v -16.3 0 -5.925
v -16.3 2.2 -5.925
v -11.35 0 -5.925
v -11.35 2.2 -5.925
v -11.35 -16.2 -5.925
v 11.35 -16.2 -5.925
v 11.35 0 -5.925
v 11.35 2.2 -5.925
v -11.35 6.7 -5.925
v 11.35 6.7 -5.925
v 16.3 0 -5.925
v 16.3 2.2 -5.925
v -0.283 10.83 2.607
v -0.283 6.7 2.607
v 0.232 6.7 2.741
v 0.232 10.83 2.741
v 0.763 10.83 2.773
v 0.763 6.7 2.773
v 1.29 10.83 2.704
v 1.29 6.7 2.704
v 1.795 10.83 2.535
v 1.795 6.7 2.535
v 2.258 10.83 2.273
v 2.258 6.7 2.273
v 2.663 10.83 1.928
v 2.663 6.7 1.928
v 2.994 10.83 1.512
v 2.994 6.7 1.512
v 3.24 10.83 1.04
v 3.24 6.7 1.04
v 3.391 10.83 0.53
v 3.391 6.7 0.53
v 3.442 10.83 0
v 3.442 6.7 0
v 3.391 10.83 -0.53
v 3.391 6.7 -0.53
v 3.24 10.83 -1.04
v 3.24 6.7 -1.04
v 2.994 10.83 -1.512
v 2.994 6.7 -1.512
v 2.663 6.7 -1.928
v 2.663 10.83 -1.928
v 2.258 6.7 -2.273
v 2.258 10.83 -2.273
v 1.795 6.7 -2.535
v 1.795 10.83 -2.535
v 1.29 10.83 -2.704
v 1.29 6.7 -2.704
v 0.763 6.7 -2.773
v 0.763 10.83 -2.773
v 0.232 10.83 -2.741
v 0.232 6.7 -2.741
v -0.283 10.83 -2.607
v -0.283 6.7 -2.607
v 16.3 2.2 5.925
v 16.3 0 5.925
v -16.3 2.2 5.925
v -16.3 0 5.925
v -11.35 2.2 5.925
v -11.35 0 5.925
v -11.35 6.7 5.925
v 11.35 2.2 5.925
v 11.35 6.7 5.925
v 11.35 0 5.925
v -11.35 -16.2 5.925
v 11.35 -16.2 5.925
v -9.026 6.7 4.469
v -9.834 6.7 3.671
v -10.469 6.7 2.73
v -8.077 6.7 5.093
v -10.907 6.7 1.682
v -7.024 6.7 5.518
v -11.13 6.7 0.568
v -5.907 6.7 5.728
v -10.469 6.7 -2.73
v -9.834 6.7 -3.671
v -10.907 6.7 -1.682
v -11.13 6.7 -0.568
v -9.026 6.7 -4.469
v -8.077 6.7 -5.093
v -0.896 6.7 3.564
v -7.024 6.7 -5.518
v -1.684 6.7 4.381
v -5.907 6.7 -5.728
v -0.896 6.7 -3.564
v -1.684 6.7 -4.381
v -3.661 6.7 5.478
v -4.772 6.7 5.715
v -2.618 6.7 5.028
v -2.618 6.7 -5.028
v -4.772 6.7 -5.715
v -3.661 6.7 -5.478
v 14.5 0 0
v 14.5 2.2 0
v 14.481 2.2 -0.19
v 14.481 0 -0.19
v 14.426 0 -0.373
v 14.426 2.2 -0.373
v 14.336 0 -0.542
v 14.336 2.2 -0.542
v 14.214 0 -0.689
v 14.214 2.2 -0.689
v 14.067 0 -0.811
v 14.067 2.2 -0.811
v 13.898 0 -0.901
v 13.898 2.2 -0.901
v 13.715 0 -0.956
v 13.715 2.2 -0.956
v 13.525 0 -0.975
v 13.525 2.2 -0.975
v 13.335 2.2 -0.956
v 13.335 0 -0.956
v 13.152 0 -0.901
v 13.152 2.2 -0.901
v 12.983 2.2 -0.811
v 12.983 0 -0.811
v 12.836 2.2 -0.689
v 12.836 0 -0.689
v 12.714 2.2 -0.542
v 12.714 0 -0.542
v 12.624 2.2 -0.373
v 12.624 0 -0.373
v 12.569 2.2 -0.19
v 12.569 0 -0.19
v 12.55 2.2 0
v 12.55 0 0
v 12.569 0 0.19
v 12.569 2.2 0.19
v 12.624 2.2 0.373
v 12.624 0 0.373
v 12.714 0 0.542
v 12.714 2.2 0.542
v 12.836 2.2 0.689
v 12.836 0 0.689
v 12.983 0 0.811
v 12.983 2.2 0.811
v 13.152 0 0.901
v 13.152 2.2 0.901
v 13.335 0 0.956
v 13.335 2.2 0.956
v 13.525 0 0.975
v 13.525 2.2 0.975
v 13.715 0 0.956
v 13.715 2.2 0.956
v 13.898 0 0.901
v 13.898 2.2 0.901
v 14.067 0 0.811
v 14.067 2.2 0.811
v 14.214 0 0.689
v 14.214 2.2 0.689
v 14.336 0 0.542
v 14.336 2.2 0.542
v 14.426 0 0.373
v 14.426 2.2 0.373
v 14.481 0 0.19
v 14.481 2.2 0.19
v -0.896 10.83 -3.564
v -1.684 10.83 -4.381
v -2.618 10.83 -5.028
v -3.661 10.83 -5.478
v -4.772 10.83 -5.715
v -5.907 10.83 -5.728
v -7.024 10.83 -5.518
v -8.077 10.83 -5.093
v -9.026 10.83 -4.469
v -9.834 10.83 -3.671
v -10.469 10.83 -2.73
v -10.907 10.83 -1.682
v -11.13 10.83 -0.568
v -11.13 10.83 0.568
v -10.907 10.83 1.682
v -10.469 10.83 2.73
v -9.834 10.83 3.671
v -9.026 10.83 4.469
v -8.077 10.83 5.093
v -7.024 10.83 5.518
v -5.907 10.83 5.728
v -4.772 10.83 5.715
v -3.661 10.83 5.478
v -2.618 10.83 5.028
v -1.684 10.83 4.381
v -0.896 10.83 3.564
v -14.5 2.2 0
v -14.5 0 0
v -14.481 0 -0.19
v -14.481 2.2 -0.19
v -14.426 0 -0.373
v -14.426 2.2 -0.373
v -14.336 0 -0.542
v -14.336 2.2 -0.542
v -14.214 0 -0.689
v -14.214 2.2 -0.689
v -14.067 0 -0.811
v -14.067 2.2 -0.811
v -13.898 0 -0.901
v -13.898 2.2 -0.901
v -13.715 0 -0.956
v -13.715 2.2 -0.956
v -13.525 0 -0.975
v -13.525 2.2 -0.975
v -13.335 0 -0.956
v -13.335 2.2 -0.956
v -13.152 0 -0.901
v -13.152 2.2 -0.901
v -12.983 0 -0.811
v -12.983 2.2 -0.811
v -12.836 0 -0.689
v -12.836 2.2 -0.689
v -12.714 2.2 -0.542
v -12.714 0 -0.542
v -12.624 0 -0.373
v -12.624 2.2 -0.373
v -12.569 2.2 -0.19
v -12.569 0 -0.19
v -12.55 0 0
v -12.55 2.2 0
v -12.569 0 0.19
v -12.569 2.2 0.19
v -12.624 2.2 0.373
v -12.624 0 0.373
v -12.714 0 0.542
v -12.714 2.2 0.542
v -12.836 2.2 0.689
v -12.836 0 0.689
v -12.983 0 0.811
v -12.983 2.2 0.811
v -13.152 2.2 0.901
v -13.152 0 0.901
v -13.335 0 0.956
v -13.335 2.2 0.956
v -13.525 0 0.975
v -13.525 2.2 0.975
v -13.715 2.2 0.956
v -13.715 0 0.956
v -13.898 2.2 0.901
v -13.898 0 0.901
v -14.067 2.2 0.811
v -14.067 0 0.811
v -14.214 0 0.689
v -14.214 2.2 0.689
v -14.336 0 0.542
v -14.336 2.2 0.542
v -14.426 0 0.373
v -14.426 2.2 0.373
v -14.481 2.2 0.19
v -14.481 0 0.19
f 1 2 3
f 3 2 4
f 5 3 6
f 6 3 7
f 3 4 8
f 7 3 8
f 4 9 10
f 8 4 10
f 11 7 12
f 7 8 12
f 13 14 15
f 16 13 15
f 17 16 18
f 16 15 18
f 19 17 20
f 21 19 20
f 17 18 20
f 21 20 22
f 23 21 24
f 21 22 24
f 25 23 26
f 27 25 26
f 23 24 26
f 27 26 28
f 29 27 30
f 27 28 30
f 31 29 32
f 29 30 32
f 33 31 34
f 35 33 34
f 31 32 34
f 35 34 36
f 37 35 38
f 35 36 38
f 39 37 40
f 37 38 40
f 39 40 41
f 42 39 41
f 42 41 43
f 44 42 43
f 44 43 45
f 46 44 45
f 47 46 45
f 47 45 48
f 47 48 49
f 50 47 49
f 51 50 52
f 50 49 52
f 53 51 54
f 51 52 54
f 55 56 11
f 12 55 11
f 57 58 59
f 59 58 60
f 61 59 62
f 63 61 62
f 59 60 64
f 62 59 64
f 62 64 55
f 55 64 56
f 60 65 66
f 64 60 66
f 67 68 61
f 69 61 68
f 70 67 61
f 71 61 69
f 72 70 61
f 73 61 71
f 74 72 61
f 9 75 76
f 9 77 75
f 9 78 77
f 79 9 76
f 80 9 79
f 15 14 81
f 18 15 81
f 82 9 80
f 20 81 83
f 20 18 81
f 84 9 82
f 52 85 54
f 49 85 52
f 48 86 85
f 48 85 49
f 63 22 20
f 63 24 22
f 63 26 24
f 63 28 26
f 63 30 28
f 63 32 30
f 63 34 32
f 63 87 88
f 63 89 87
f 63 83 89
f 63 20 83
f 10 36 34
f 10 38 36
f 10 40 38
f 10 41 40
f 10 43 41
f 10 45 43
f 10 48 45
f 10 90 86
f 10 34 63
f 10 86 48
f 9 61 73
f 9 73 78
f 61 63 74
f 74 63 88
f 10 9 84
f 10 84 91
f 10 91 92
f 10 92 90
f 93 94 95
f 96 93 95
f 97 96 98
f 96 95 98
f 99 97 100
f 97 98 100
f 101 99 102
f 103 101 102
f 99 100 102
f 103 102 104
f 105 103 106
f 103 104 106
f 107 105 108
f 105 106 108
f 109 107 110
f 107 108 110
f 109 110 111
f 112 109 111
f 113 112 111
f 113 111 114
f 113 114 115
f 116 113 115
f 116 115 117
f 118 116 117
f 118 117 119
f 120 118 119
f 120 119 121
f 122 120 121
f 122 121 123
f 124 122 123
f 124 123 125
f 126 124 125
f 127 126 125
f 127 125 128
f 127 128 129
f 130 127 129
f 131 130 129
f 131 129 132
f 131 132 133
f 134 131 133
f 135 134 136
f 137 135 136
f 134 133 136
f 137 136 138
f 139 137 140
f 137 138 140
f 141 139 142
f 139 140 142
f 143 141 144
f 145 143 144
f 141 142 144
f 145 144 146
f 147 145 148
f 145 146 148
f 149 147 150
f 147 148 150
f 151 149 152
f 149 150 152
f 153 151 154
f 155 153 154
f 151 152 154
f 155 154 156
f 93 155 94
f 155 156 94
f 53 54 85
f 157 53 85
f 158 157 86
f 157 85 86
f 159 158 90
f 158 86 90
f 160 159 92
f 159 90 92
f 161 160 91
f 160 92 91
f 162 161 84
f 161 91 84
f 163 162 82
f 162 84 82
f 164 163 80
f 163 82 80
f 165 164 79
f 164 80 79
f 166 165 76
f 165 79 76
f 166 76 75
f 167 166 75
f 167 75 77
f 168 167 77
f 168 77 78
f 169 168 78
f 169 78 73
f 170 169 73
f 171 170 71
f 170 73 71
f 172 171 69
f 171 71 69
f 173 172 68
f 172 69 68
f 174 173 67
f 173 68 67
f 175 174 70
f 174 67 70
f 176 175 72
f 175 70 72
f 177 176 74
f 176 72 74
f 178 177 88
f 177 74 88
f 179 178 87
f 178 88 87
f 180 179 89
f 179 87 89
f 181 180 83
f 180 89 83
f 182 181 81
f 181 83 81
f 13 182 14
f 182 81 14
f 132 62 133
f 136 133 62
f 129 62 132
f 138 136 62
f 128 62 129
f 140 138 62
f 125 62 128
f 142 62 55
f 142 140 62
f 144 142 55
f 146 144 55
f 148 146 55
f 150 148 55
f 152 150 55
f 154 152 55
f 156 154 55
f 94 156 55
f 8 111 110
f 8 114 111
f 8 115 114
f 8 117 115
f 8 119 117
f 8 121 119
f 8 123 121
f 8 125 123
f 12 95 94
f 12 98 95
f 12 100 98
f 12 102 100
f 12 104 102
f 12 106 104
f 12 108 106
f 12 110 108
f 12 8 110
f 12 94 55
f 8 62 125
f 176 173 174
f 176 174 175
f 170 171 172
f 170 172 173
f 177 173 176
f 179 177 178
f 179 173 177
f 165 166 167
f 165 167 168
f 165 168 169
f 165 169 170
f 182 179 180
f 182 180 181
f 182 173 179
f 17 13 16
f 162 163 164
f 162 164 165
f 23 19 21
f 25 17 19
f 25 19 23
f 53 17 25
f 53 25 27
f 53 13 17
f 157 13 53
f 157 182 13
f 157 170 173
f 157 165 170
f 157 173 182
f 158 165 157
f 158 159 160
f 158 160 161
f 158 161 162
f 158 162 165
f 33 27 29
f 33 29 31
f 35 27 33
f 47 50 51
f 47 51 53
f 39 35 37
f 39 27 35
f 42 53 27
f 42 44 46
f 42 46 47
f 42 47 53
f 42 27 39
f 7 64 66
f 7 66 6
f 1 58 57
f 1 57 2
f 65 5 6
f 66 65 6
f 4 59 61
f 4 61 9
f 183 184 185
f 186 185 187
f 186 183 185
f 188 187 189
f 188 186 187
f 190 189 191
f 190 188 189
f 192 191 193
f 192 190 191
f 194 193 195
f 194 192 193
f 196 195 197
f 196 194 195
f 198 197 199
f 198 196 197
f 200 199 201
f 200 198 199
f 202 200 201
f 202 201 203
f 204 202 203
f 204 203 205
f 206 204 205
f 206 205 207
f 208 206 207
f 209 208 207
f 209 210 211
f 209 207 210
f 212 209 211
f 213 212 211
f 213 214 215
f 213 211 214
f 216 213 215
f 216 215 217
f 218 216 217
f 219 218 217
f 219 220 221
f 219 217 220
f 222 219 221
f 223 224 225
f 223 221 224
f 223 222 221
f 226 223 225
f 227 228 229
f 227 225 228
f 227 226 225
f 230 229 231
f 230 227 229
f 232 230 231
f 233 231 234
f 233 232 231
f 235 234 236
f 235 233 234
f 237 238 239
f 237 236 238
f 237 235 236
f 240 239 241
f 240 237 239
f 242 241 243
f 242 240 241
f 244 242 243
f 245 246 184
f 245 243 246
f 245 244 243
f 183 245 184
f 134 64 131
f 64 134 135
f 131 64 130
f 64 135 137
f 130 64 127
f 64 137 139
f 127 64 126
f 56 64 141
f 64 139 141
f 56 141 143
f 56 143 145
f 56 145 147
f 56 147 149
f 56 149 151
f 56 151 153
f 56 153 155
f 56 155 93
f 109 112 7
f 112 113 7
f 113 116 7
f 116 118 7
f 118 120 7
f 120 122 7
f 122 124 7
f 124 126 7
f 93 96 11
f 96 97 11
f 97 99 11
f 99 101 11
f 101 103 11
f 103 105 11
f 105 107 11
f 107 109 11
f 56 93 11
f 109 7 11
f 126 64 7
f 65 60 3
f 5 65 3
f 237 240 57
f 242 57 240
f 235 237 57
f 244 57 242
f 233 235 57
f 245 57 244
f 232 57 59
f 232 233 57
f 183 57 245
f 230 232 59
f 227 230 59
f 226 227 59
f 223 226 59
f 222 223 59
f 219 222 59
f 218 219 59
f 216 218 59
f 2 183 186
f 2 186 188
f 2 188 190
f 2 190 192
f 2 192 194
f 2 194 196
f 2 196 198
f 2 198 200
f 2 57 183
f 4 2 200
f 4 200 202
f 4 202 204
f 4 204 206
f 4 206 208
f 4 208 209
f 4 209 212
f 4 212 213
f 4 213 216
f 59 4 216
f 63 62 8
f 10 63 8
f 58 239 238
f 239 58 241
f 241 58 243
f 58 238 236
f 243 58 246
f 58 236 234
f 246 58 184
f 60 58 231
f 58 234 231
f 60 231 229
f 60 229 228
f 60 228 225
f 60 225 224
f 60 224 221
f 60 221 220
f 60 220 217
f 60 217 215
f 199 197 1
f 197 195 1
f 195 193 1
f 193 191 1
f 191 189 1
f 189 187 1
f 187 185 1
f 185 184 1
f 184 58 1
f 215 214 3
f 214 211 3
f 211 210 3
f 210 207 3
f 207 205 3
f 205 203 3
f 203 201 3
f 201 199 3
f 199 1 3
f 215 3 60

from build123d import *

# Parameters (mm, degrees)
SKETCH2_W                = 32.6
SKETCH2_H                = 11.85
BOSS_EXTRUDE2_DEPTH      = 2.2
SKETCH3_W                = 22.7
SKETCH3_H                = 11.85
BOSS_EXTRUDE3_DEPTH      = 4.5
BOSS_EXTRUDE3_DEPTH_BACK = 18.4
SKETCH4_R                = 0.975
CUT_EXTRUDE1_DEPTH       = 4.5
SKETCH5_R                = 5.75
SKETCH5_R_2              = 2.775
BOSS_EXTRUDE4_DEPTH      = 4.13


with BuildPart() as part:
    # Sketch2 → Boss-Extrude2 (new body)
    with BuildSketch(Plane(origin=(0, 0, 0), x_dir=(1, 0, 0), z_dir=(0, 1, 0))):
        Rectangle(SKETCH2_W, SKETCH2_H)
    extrude(amount=BOSS_EXTRUDE2_DEPTH)

    # Sketch3 → Boss-Extrude3 (add, two sides)
    with BuildSketch(Plane(origin=(0, 2.2, 0), x_dir=(1, 0, 0), z_dir=(0, 1, 0))) as boss_extrude3_sk:
        Rectangle(SKETCH3_W, SKETCH3_H)
    extrude(amount=BOSS_EXTRUDE3_DEPTH)
    extrude(boss_extrude3_sk.sketch, amount=-BOSS_EXTRUDE3_DEPTH_BACK)

    # Sketch4 → Cut-Extrude1 (cut)
    with BuildSketch(Plane(origin=(0, 2.2, 0), x_dir=(1, 0, 0), z_dir=(0, 1, 0))):
        with Locations((13.525, 0)):
            Circle(SKETCH4_R)
    cut_extrude1 = extrude(amount=-CUT_EXTRUDE1_DEPTH, mode=Mode.SUBTRACT)

    # Mirror1: Cut-Extrude1 across plane
    add(cut_extrude1.mirror(Plane(origin=(0, 0, 0), x_dir=(0, 0, 1), z_dir=(1, 0, 0))), mode=Mode.SUBTRACT)

    # Sketch5 → Boss-Extrude4 (add)
    with BuildSketch(Plane(origin=(0, 6.7, 0), x_dir=(1, 0, 0), z_dir=(0, 1, 0))):
        with Locations((-5.40813132, 0)):
            Circle(SKETCH5_R)
        with Locations((0.66686868, 0)):
            Circle(SKETCH5_R_2)
    extrude(amount=BOSS_EXTRUDE4_DEPTH)


solid = part.part
